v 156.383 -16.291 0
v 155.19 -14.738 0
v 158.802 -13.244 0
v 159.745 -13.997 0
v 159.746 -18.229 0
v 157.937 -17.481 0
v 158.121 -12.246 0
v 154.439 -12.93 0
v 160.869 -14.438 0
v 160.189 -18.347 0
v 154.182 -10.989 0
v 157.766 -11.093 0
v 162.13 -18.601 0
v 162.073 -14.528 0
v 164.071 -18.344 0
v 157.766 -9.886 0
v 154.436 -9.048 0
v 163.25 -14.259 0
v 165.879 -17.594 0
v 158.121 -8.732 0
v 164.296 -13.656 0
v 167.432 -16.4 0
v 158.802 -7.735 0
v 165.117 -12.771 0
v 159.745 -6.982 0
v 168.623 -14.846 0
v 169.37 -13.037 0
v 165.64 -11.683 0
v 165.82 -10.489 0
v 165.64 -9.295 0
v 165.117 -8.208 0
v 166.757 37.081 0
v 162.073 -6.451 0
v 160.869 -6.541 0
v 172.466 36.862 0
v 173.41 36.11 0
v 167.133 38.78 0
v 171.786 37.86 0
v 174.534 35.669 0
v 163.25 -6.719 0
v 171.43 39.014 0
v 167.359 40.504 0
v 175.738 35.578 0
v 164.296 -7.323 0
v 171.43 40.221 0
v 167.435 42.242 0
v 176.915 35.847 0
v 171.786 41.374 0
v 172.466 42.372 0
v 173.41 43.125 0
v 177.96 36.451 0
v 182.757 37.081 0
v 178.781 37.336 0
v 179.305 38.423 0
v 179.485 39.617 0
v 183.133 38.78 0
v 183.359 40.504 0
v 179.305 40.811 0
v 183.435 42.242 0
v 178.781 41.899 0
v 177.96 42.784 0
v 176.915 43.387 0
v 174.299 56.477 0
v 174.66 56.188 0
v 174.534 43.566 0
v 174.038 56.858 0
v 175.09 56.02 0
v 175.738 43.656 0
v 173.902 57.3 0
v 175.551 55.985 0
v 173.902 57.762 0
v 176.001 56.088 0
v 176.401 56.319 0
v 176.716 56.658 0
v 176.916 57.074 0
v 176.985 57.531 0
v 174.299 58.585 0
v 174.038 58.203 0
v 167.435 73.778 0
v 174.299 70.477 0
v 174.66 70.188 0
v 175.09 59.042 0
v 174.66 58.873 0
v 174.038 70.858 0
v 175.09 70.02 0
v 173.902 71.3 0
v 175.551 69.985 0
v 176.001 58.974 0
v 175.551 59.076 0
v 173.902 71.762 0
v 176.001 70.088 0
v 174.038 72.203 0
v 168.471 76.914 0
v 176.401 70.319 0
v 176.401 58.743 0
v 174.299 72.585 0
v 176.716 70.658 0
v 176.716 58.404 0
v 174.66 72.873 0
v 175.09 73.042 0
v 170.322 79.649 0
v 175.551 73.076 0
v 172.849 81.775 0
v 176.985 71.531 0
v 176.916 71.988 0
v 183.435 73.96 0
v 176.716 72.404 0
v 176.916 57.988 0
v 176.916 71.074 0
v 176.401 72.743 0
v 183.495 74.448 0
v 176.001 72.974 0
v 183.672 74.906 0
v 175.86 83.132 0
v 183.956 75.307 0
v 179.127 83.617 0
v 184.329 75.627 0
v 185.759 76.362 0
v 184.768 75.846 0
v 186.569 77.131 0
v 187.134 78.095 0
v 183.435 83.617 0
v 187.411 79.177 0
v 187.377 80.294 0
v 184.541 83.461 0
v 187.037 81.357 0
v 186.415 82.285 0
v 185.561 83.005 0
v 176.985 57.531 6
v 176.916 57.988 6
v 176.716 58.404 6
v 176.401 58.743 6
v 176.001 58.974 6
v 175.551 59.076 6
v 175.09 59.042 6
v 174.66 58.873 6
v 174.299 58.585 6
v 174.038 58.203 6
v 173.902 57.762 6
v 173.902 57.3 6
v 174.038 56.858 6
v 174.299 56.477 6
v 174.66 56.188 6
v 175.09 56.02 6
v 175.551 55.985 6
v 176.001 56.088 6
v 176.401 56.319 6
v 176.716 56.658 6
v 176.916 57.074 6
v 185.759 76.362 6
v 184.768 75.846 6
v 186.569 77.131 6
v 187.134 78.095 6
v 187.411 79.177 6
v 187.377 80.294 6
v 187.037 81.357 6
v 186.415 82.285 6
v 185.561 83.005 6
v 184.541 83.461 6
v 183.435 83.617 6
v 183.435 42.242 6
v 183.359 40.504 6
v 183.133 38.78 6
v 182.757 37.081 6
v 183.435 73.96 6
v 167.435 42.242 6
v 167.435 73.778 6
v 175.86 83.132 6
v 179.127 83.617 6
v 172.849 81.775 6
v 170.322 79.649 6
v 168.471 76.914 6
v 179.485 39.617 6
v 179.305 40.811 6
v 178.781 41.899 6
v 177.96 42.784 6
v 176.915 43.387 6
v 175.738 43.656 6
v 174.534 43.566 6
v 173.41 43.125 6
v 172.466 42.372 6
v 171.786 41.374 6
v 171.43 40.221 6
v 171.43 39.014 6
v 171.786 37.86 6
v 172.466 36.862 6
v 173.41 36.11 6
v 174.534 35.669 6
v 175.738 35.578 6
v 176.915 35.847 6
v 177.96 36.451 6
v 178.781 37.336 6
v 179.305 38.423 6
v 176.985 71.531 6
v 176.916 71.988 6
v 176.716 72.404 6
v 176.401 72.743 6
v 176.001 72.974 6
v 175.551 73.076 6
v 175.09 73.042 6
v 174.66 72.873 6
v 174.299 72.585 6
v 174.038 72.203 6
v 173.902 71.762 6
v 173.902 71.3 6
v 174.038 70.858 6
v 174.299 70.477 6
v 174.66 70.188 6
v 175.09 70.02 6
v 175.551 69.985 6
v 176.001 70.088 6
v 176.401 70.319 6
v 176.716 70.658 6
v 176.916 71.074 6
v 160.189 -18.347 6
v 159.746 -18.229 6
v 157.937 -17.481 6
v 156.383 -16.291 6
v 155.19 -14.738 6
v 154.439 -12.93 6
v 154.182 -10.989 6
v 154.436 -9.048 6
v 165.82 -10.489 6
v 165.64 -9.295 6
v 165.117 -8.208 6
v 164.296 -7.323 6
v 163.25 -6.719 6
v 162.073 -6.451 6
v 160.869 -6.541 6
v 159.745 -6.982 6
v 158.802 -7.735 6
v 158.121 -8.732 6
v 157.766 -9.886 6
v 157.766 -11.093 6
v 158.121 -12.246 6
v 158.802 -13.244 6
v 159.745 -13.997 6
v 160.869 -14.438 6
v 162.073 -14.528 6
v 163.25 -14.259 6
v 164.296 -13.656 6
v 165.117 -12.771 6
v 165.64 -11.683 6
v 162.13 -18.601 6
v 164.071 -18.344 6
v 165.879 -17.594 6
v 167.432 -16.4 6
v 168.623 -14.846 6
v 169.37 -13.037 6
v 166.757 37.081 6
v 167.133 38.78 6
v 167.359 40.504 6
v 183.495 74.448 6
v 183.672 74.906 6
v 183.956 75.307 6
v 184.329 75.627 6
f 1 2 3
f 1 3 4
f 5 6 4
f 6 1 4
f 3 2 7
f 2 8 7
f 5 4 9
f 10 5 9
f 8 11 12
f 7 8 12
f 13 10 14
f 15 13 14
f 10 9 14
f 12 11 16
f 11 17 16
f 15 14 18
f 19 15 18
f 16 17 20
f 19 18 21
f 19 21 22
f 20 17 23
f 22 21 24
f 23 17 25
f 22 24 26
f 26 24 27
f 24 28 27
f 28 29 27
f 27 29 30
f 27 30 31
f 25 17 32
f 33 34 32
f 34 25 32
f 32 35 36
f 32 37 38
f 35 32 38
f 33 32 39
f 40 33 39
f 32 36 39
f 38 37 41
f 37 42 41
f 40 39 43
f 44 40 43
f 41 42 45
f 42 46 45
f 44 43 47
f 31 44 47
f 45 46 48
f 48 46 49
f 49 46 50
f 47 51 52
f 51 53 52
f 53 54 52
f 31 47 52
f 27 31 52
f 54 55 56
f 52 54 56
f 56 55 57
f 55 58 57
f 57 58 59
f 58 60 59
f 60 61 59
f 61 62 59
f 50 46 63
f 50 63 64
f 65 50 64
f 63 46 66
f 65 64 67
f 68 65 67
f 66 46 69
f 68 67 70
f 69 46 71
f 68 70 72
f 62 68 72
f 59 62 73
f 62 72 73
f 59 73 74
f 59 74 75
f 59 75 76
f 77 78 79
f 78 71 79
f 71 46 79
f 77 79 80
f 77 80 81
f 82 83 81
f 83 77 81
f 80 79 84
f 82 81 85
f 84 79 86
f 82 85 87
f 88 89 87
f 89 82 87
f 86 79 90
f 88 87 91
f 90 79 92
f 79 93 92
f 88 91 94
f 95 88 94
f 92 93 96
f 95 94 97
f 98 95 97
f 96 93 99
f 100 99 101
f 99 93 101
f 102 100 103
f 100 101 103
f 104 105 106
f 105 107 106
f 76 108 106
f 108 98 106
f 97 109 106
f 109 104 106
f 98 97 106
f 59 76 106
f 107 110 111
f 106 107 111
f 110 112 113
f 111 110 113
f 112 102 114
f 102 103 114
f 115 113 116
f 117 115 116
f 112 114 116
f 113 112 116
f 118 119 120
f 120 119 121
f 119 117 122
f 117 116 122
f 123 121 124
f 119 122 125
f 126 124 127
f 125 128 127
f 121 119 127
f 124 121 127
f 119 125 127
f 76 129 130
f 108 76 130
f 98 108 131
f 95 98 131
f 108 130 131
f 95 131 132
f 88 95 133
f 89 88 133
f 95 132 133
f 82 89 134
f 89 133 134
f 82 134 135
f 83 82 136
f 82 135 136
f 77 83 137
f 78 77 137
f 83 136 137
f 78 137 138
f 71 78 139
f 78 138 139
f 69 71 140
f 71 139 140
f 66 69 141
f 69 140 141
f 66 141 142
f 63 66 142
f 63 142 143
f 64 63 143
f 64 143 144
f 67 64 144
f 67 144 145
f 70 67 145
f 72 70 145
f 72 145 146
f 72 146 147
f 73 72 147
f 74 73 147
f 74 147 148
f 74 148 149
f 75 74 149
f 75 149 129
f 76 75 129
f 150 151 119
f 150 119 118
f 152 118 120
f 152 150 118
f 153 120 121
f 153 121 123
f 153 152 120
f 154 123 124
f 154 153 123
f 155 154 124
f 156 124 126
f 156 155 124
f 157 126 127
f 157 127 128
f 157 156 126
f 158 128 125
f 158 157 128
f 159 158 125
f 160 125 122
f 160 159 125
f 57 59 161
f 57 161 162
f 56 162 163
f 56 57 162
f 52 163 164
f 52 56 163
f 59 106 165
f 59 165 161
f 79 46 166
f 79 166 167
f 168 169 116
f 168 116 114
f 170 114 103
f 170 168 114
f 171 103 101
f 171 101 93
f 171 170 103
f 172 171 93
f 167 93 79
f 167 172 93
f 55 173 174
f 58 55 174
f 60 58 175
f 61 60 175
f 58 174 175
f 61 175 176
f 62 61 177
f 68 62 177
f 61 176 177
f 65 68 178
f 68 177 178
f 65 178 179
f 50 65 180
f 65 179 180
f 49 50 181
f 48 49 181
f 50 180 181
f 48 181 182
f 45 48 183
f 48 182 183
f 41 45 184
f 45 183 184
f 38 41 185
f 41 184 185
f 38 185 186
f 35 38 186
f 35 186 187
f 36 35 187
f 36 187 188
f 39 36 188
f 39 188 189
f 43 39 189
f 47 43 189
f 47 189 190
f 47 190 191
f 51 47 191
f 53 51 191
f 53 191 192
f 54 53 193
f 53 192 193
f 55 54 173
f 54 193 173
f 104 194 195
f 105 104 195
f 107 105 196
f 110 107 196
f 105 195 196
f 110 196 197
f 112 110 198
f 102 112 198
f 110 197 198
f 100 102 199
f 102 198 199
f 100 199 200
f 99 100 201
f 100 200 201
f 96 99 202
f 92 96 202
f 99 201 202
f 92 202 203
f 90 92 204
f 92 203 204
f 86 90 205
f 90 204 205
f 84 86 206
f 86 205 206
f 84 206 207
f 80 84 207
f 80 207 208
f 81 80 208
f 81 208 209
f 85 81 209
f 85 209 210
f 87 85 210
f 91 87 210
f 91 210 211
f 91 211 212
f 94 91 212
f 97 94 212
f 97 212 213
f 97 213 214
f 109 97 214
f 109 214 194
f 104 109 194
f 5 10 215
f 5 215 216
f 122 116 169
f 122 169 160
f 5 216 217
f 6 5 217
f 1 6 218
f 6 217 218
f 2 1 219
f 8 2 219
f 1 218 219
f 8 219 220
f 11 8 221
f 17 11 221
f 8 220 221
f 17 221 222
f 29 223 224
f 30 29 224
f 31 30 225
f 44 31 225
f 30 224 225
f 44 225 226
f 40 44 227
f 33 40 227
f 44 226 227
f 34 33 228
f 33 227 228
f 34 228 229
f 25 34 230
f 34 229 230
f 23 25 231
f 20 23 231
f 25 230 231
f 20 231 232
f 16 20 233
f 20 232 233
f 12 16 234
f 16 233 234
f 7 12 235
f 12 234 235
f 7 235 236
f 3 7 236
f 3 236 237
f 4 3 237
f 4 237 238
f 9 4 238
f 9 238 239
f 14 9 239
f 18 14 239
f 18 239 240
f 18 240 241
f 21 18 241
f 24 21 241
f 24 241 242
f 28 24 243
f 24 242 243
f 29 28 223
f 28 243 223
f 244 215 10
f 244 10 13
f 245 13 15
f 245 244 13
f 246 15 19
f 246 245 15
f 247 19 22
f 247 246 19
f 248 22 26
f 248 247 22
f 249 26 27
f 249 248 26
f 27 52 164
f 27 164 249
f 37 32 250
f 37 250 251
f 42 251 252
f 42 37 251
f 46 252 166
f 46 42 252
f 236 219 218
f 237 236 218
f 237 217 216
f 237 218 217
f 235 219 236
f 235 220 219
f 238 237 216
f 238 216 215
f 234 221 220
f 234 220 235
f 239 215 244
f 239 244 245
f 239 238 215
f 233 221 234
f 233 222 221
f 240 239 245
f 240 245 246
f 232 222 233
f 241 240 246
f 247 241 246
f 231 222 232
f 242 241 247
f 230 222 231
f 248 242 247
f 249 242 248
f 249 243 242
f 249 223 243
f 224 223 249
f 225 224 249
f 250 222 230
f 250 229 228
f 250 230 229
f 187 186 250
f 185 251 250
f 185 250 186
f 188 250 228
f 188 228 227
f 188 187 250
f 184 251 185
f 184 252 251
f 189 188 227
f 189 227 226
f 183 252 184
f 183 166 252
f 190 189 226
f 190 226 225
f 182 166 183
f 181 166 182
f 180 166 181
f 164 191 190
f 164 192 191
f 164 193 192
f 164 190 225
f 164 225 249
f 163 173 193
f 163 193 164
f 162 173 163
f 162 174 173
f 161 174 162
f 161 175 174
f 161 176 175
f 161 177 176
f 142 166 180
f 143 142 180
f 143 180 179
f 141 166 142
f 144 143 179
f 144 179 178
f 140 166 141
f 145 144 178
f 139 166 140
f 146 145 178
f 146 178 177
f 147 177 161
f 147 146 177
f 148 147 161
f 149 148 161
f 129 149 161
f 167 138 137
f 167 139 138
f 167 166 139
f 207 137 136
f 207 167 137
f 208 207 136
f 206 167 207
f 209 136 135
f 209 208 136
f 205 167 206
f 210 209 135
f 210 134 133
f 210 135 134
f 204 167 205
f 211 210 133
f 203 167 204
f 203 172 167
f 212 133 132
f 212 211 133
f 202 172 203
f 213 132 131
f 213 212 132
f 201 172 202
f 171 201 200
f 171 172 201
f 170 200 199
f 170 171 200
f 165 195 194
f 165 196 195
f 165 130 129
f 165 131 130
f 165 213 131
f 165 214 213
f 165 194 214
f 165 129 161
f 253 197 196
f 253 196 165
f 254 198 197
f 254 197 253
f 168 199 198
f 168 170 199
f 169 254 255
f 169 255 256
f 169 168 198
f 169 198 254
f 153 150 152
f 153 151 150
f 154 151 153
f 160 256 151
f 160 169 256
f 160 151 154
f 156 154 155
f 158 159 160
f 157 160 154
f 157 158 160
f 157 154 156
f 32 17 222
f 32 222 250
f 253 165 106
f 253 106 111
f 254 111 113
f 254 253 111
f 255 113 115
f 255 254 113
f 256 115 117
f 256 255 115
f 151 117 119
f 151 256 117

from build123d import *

# Parameters (mm, degrees)
DODANIE_WYCI_GNI_CIE1_DEPTH = 6
SZKIC2_R                    = 4.05
WYTNIJ_WYCI_GNI_CIE1_DEPTH  = 6
SZKIC4_R                    = 4.05
WYTNIJ_WYCI_GNI_CIE4_DEPTH  = 6
WYTNIJ_WYCI_GNI_CIE5_DEPTH  = 6
SZKIC6_R                    = 4
DODANIE_WYCI_GNI_CIE2_DEPTH = 6
SZKIC7_R                    = 1.55
WYTNIJ_WYCI_GNI_CIE6_DEPTH  = 10
DODANIE_WYCI_GNI_CIE3_DEPTH = 6
WYTNIJ_WYCI_GNI_CIE7_DEPTH  = 6


with BuildPart() as part:
    # Szkic1 → Dodanie-wyciągnięcie1 (new body)
    with BuildSketch(Plane.XY):
        with BuildLine():
            Line((183.434880274, 83.617157096), (183.434880274, 42.242261437))
            ThreePointArc((183.434880274, 42.242261437), (183.264795483, 39.639481612), (182.757433993, 37.080971114))
            Line((182.757433993, 37.080971114), (167.434880274, -20.282759431))
            Line((167.434880274, -20.282759431), (152.500436986, -16.293587051))
            Line((152.500436986, -16.293587051), (166.757433993, 37.080971114))
            ThreePointArc((166.757433993, 37.080971114), (167.264795483, 39.639481612), (167.434880274, 42.242261437))
            Line((167.434880274, 42.242261437), (167.434880274, 83.617157096))
            Line((167.434880274, 83.617157096), (183.434880274, 83.617157096))
        make_face()
    extrude(amount=DODANIE_WYCI_GNI_CIE1_DEPTH)

    # Szkic2 → Wytnij-wyciągnięcie1 (cut)
    with BuildSketch(Plane.XY.offset(6)):
        with Locations((175.434880274, 39.617157096)):
            Circle(SZKIC2_R)
        with Locations((175.434880274, -14.382842904)):
            Circle(SZKIC2_R)
    extrude(amount=-WYTNIJ_WYCI_GNI_CIE1_DEPTH, mode=Mode.SUBTRACT)

    # Szkic4 → Wytnij-wyciągnięcie4 (cut)
    with BuildSketch(Plane.XY.offset(6)):
        with Locations((161.770374916, -10.489221815)):
            Circle(SZKIC4_R)
    extrude(amount=-WYTNIJ_WYCI_GNI_CIE4_DEPTH, mode=Mode.SUBTRACT)

    # Szkic5 → Wytnij-wyciągnięcie5 (cut)
    with BuildSketch(Plane.XY.offset(6)):
        with BuildLine():
            Line((167.434880274, 73.777889147), (167.434880274, 83.617157096))
            Line((167.434880274, 83.617157096), (179.126801066, 83.617157096))
            ThreePointArc((179.126801066, 83.617157096), (171.51222692, 80.799152225), (167.434880274, 73.777889147))
        make_face()
    extrude(amount=-WYTNIJ_WYCI_GNI_CIE5_DEPTH, mode=Mode.SUBTRACT)

    # Szkic6 → Dodanie-wyciągnięcie2 (add)
    with BuildSketch(Plane.XY.offset(6)):
        with Locations((183.434880274, 79.617157096)):
            Circle(SZKIC6_R)
    extrude(amount=-DODANIE_WYCI_GNI_CIE2_DEPTH)

    # Szkic7 → Wytnij-wyciągnięcie6 (cut)
    with BuildSketch(Plane.XY.offset(6)):
        with Locations((175.434880274, 57.530770571)):
            Circle(SZKIC7_R)
        with Locations((175.434880274, 71.530770571)):
            Circle(SZKIC7_R)
    extrude(amount=-WYTNIJ_WYCI_GNI_CIE6_DEPTH, mode=Mode.SUBTRACT)

    # Szkic8 → Dodanie-wyciągnięcie3 (add)
    with BuildSketch(Plane.XY.offset(6)):
        with BuildLine():
            Line((184.768213607, 75.84592093), (183.01913403, 76.038564372))
            Line((183.01913403, 76.038564372), (183.434880274, 73.960302847))
            ThreePointArc((183.434880274, 73.960302847), (183.801887112, 75.115003385), (184.768213607, 75.84592093))
        make_face()
    extrude(amount=-DODANIE_WYCI_GNI_CIE3_DEPTH)

    # Szkic10 → Wytnij-wyciągnięcie7 (cut)
    with BuildSketch(Plane.XY.offset(6)):
        with BuildLine():
            Line((169.370364145, -13.036801787), (167.434880274, -20.282759431))
            Line((167.434880274, -20.282759431), (160.18892263, -18.34727556))
            ThreePointArc((160.18892263, -18.34727556), (165.879478517, -17.593577473), (169.370364145, -13.036801787))
        make_face()
        with BuildLine():
            Line((154.435920857, -9.047629406), (152.500436986, -16.293587051))
            Line((152.500436986, -16.293587051), (159.74639463, -18.229070922))
            ThreePointArc((159.74639463, -18.229070922), (155.189618945, -14.738185294), (154.435920857, -9.047629406))
        make_face()
    extrude(amount=-WYTNIJ_WYCI_GNI_CIE7_DEPTH, mode=Mode.SUBTRACT)


solid = part.part
